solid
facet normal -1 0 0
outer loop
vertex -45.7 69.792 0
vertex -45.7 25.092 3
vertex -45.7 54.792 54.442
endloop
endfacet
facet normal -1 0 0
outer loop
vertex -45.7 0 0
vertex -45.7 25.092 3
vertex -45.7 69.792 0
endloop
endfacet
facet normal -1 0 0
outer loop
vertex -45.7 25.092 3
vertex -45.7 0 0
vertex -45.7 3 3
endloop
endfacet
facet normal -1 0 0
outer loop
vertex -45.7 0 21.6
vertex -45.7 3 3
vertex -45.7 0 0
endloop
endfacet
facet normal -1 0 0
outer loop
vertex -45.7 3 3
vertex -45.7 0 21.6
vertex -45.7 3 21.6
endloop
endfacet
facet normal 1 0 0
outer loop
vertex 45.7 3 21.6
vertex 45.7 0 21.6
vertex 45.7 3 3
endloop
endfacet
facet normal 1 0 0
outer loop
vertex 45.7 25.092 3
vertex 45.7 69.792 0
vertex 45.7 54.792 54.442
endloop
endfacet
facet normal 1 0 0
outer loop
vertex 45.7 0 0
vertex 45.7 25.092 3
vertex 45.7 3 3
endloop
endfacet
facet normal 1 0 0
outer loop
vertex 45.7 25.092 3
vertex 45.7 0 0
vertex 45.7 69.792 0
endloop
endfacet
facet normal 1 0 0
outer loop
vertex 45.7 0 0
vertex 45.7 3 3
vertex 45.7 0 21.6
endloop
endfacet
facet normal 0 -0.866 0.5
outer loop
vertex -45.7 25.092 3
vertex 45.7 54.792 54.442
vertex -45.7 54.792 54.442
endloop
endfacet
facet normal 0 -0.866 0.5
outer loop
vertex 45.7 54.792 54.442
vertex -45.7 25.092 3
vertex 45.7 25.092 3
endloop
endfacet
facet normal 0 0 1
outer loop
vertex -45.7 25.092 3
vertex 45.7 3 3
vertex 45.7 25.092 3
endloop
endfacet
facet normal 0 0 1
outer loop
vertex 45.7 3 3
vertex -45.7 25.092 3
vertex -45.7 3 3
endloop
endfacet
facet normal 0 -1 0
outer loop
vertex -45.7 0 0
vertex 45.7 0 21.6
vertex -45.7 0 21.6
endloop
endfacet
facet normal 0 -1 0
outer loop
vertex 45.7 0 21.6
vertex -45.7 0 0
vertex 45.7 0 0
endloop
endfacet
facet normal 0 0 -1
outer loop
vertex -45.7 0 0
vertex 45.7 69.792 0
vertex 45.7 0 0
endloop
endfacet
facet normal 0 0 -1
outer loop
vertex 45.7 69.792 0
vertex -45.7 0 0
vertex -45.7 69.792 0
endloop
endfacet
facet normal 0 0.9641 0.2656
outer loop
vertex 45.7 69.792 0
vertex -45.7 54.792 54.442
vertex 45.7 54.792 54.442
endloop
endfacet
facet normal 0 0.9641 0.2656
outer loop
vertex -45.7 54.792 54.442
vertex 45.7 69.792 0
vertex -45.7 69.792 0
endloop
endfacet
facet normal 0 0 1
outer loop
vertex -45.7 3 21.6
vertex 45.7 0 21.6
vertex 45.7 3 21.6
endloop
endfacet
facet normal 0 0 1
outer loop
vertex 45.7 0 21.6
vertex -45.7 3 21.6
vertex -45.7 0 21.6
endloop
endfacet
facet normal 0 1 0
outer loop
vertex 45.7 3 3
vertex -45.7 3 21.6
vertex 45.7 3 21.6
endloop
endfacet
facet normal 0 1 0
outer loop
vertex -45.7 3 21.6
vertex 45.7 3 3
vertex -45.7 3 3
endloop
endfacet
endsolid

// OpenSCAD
// file: ../case/case_dimensions.scad
// Shared Piblo case dimensions, in mm; sources/estimates: DIMENSIONS.md.
dev_L = 84.0;
dev_W = 54.0;
dev_T_block = 19.6;
clr = 0.30;
clr_z = 0.30;
wall = 2.4;
floor_t = 1.8;
plate_t = 1.5;
// main file
// Piblo desk stand. UNTESTED: check balance, fit and access before use.
include <../case/case_dimensions.scad>
angle = 60; // Screen angle above the desk, degrees; 30..80.
a = max(30, min(80, angle));
case_L = dev_L + 2*(clr + wall);
case_W = dev_W + 2*(clr + wall);
case_T = dev_T_block + clr_z + plate_t + floor_t;
width = case_L + 2;
toe = case_T*sin(a) + 5;
run = case_W*cos(a);
rise = case_W*sin(a);
depth = toe + run + 15;
union() {
    translate([-width/2, 0, 0]) rotate([90, 0, 90]) linear_extrude(width)
        polygon([[0,0], [depth,0], [toe+run,rise+3], [toe,3], [0,3]]);
    // Front stop retains the lower edge; side faces stay open for cables.
    translate([-width/2, 0, 3]) cube([width, 3, case_T*cos(a)+7]);
}
